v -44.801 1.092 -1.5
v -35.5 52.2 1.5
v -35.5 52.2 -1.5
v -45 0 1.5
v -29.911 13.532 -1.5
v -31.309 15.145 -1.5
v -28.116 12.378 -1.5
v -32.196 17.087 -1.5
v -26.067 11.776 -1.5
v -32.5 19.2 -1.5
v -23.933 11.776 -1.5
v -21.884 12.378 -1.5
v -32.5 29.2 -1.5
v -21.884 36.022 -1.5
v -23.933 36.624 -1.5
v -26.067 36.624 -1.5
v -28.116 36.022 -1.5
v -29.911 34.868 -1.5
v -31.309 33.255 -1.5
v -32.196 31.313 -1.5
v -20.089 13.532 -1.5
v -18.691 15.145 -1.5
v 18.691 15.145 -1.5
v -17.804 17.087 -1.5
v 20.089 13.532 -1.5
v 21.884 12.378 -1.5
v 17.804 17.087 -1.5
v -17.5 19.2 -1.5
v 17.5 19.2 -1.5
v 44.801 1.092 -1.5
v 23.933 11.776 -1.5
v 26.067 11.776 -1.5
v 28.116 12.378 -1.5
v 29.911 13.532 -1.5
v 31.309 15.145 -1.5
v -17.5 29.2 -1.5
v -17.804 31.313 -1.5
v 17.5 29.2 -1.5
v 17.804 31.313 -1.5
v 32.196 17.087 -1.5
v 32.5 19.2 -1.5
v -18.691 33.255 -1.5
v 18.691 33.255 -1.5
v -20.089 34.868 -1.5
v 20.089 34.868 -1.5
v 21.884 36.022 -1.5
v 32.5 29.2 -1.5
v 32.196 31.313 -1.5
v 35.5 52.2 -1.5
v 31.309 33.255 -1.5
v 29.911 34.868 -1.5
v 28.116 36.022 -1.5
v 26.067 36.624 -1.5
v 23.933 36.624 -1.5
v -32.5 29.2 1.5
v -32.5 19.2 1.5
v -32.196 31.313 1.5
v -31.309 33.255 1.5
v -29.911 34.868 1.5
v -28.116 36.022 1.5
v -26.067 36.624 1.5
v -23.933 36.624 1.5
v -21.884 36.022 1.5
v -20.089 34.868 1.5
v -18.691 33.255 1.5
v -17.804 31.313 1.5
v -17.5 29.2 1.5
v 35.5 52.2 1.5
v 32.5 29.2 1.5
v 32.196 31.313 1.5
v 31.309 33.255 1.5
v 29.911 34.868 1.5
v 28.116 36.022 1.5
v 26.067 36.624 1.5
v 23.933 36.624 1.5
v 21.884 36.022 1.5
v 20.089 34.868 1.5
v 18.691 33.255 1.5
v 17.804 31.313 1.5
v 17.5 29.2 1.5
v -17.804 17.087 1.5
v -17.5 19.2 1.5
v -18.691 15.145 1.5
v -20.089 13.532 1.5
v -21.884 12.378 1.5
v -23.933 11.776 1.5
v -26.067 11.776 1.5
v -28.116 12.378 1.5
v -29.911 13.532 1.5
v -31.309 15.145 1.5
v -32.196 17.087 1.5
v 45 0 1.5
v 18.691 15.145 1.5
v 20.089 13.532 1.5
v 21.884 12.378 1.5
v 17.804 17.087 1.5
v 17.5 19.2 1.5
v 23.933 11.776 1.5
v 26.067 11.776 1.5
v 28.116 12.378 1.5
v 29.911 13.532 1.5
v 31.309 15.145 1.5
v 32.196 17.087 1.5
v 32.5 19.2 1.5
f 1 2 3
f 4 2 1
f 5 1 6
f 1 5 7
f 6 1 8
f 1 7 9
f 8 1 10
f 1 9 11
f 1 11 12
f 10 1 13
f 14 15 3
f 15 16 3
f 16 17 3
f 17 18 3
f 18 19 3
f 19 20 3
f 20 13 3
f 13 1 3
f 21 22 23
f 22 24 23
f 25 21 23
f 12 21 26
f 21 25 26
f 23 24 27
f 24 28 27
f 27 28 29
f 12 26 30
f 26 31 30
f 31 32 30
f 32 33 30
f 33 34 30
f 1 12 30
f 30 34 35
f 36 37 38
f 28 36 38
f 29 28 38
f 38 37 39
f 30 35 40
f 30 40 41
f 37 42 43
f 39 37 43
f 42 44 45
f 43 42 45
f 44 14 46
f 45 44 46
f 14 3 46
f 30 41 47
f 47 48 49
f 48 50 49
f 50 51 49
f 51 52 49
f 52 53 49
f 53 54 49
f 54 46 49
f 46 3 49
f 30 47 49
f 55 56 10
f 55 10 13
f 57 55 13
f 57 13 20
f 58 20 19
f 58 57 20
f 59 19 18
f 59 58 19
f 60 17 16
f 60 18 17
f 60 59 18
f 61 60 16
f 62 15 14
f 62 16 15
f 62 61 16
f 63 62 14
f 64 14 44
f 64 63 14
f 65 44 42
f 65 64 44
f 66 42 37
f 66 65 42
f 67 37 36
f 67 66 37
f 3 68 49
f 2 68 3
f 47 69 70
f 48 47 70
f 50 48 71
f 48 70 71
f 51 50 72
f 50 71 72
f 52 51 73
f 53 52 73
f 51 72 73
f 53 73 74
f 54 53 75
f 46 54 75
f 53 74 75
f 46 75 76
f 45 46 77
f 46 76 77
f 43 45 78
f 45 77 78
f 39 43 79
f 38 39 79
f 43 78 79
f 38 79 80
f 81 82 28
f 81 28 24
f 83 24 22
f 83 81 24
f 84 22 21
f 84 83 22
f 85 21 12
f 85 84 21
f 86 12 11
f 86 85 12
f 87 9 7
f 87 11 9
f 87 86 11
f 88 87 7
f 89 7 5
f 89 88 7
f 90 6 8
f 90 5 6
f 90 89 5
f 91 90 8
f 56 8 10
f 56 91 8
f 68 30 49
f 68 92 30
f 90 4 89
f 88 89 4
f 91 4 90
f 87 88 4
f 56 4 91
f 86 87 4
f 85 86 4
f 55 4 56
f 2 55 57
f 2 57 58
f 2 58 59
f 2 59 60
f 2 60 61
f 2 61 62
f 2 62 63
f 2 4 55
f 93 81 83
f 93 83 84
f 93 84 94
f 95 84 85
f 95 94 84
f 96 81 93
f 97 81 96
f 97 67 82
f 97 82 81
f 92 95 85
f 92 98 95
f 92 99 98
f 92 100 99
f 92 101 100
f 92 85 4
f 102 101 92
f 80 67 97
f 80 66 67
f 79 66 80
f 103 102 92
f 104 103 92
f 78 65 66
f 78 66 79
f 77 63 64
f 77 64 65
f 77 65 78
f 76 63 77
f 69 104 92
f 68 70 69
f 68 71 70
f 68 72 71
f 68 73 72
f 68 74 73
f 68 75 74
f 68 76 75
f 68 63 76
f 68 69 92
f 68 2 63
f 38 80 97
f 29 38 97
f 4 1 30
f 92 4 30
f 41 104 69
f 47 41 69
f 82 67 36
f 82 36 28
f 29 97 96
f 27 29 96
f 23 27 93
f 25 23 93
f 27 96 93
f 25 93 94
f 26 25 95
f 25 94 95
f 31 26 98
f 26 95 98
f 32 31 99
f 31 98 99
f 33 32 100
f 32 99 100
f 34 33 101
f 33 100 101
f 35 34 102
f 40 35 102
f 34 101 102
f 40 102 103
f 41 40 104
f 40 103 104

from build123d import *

# Parameters (mm, degrees)
BOSS_EXTRUDE1_DEPTH = 1.5
CUT_EXTRUDE1_DEPTH  = 69.98434605
CHAMFER1_SIZE2      = 1.091910703
CHAMFER1_SIZE       = 3


with BuildPart() as part:
    # Sketch1 → Boss-Extrude1 (new, symmetric)
    with BuildSketch(Plane.XY):
        Polygon((-45, 0), (45, 0), (35.5, 52.2), (-35.5, 52.2), align=None)
    extrude(amount=BOSS_EXTRUDE1_DEPTH, both=True)

    # Sketch2 → Cut-Extrude1 (cut, through all)
    with BuildSketch(Plane.XY.offset(1.5)):
        with BuildLine():
            Line((-17.5, 29.2), (-17.5, 19.2))
            ThreePointArc((-17.5, 19.2), (-25, 11.7), (-32.5, 19.2))
            Line((-32.5, 19.2), (-32.5, 29.2))
            ThreePointArc((-32.5, 29.2), (-25, 36.7), (-17.5, 29.2))
        make_face()
        with BuildLine():
            Line((17.5, 29.2), (17.5, 19.2))
            ThreePointArc((17.5, 19.2), (25, 11.7), (32.5, 19.2))
            Line((32.5, 19.2), (32.5, 29.2))
            ThreePointArc((32.5, 29.2), (25, 36.7), (17.5, 29.2))
        make_face()
    extrude(amount=-CUT_EXTRUDE1_DEPTH, mode=Mode.SUBTRACT)

    # Chamfer1
    chamfer1_edges = [part.edges().sort_by_distance(p)[0] for p in [
        (0, 0, -1.5),
    ]]
    chamfer1_side = [part.faces().sort_by_distance(p)[0] for p in [
        (0, 0, -1.478161786),
    ]]
    chamfer(chamfer1_edges, length=CHAMFER1_SIZE - 0.0001, length2=CHAMFER1_SIZE2 - 0.0001, reference=chamfer1_side[0])  # a hair under: the kernel refuses the full size


solid = part.part
